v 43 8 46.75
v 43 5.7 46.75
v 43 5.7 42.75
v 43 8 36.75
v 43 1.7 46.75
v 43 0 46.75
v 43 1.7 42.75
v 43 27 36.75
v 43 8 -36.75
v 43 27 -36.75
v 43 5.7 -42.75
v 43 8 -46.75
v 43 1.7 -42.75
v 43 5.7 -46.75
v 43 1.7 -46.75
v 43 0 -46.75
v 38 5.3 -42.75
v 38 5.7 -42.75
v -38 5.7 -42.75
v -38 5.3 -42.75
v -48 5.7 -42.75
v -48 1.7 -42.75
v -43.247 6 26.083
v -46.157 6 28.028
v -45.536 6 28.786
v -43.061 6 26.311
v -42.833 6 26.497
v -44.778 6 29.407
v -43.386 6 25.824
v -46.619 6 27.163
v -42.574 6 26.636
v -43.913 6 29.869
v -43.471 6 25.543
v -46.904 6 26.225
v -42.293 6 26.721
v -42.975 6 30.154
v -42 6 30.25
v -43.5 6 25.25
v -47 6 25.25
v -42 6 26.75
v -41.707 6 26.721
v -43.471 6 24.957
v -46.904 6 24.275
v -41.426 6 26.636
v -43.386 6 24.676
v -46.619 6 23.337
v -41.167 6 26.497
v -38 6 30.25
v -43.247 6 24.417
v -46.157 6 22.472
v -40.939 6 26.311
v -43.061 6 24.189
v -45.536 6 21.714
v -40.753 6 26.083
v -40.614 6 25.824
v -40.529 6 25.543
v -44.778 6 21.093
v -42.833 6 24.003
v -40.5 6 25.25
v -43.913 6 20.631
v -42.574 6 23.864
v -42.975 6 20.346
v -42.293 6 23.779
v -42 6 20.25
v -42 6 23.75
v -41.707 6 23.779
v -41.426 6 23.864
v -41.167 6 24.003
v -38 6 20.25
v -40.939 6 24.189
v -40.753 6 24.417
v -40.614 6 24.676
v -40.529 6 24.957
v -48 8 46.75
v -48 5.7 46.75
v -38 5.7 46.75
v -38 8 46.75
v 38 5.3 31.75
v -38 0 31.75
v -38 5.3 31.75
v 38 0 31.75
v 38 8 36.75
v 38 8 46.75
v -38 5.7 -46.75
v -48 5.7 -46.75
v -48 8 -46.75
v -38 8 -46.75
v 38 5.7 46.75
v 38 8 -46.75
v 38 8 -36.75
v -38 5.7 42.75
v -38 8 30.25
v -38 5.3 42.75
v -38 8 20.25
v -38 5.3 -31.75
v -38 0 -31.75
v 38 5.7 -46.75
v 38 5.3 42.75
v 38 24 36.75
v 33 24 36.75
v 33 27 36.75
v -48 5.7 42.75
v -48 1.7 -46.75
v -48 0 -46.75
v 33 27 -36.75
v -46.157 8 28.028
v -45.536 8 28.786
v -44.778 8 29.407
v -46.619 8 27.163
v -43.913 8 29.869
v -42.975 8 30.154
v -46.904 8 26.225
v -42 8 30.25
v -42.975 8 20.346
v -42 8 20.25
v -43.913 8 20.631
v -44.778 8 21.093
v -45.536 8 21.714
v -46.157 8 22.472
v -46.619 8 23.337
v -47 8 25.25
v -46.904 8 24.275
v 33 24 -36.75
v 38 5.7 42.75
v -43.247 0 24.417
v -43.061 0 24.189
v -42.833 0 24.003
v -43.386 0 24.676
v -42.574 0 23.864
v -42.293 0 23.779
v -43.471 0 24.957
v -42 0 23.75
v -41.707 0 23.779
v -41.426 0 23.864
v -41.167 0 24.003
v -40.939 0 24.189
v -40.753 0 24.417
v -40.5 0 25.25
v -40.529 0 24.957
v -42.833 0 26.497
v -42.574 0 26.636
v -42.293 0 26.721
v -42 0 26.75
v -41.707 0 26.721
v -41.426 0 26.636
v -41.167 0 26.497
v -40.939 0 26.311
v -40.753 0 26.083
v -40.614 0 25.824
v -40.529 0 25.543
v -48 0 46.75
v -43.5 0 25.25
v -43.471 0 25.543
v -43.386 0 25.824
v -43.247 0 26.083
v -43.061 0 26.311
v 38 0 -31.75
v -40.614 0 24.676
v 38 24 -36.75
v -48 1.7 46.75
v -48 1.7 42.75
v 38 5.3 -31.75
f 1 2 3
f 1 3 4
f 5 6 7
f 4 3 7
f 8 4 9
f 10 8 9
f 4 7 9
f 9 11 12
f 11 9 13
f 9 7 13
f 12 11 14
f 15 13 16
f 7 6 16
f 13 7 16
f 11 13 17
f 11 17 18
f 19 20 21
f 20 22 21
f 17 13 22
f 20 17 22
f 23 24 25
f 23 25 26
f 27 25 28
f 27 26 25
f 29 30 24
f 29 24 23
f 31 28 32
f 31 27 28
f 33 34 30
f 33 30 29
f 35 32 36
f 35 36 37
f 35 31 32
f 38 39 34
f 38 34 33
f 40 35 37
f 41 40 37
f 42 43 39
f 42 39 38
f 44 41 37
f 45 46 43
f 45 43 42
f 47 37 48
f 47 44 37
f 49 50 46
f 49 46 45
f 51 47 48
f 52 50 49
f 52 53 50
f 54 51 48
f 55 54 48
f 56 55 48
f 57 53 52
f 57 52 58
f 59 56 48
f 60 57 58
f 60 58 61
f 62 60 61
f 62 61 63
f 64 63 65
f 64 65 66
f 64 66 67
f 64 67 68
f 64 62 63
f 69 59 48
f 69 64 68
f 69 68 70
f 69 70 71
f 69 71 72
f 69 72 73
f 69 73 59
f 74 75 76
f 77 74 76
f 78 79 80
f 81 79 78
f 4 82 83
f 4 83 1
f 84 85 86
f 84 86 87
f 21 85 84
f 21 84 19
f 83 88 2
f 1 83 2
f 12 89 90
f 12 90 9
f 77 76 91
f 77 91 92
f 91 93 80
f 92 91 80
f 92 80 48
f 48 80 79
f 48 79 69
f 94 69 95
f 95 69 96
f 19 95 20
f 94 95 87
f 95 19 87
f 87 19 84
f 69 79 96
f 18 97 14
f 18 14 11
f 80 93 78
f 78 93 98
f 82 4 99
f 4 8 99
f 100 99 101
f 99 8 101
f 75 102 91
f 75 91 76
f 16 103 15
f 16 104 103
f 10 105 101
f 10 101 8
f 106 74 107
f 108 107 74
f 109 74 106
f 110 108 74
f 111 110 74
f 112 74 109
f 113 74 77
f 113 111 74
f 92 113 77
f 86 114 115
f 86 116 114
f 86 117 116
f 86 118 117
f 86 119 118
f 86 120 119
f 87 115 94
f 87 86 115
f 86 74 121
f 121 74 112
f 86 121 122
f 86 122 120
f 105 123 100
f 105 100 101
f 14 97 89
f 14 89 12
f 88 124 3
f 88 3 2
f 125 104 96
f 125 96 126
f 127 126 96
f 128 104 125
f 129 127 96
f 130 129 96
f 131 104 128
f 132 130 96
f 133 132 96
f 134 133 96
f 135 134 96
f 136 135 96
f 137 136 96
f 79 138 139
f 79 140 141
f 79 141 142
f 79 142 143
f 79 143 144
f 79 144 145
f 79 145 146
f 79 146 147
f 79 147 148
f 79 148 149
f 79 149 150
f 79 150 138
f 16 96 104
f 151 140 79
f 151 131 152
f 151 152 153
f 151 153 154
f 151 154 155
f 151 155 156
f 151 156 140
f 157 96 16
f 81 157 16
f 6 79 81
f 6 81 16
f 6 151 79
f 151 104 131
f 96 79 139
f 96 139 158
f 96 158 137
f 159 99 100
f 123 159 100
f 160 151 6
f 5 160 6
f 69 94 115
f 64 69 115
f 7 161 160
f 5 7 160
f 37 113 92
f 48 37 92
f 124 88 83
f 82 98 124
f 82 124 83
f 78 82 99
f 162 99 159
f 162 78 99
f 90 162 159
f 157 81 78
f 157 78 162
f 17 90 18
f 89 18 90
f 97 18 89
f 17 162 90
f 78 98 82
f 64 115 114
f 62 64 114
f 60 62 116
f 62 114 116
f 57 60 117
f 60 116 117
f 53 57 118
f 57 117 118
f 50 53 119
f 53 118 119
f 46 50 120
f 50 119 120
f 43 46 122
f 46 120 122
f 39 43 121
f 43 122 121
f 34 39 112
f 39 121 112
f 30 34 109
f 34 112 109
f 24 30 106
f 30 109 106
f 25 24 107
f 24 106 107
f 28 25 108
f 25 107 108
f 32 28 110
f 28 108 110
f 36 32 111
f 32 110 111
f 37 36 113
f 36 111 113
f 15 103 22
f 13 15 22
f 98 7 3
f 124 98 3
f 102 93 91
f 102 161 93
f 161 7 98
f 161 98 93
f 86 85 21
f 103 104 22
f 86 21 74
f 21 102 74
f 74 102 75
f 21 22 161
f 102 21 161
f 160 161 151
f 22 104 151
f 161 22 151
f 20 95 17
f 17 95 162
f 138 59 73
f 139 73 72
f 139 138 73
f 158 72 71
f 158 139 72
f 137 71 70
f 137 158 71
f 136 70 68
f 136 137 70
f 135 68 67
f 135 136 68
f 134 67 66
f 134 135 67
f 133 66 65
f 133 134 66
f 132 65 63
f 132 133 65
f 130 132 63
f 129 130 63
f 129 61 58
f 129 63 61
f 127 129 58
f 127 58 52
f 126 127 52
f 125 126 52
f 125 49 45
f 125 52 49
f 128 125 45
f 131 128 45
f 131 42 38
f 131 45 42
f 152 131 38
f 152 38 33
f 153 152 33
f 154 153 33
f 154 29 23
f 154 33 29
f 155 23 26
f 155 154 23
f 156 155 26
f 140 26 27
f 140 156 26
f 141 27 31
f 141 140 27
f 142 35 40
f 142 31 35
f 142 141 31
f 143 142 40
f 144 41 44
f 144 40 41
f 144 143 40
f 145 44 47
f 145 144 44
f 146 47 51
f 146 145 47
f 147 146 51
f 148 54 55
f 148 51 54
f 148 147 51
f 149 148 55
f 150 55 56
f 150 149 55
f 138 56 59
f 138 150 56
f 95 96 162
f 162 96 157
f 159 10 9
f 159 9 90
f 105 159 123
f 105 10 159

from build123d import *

# Parameters (mm, degrees)
ESQUISSE1_W             = 91
ESQUISSE1_H             = 73.5
ESQUISSE1_R             = 1.5
ESQUISSE1_W_2           = 76
ESQUISSE1_H_2           = 63.5
BOSS_EXTRU_1_DEPTH      = 8
ENL_V_MAT_EXTRU_1_DEPTH = 2
ESQUISSE3_W             = 76
ESQUISSE3_H             = 5
ENL_V_MAT_EXTRU_2_DEPTH = 2.7
BOSS_EXTRU_2_DEPTH      = 73.5
ESQUISSE5_W             = 91
ESQUISSE5_H             = 10
BOSS_EXTRU_3_DEPTH      = 5.3
ESQUISSE6_W             = 5
ESQUISSE6_H             = 10
ESQUISSE6_W_2           = 10
BOSS_EXTRU_4_DEPTH      = 2.7
ESQUISSE7_W             = 4
ESQUISSE7_H             = 4
ENL_V_MAT_EXTRU_3_DEPTH = 92


with BuildPart() as part:
    # Esquisse1 → Boss.-Extru.1 (new body)
    with BuildSketch(Plane(origin=(0, 0, 0), x_dir=(1, 0, 0), z_dir=(0, 1, 0))):
        with Locations((-2.5, 0)):
            Rectangle(ESQUISSE1_W, ESQUISSE1_H)
        with Locations((-42, -25.25)):
            Circle(ESQUISSE1_R, mode=Mode.SUBTRACT)
        Rectangle(ESQUISSE1_W_2, ESQUISSE1_H_2, mode=Mode.SUBTRACT)
    extrude(amount=BOSS_EXTRU_1_DEPTH)

    # Esquisse2 → Enlèv. mat.-Extru.1 (cut)
    with BuildSketch(Plane(origin=(0, 8, 0), x_dir=(1, 0, 0), z_dir=(0, 1, 0))):
        with BuildLine():
            Line((-42, -30.25), (-38, -30.25))
            Line((-38, -30.25), (-38, -20.25))
            Line((-38, -20.25), (-42, -20.25))
            ThreePointArc((-42, -20.25), (-47, -25.25), (-42, -30.25))
        make_face()
    extrude(amount=-ENL_V_MAT_EXTRU_1_DEPTH, mode=Mode.SUBTRACT)

    # Esquisse3 → Enlèv. mat.-Extru.2 (cut)
    with BuildSketch(Plane(origin=(0, 8, 0), x_dir=(1, 0, 0), z_dir=(0, 1, 0))):
        with Locations((0, -34.25)):
            Rectangle(ESQUISSE3_W, ESQUISSE3_H)
        with Locations((0, 34.25)):
            Rectangle(ESQUISSE3_W, ESQUISSE3_H)
    extrude(amount=-ENL_V_MAT_EXTRU_2_DEPTH, mode=Mode.SUBTRACT)

    # Esquisse4 → Boss.-Extru.2 (add)
    with BuildSketch(Plane(origin=(0, 0, -36.75), x_dir=(-1, 0, 0), z_dir=(0, 0, -1))):
        Polygon((-43, 8), (-38, 8), (-38, 24), (-33, 24), (-33, 27), (-38.815944916, 27), (-43, 27), align=None)
    extrude(amount=-BOSS_EXTRU_2_DEPTH)

    # Esquisse5 → Boss.-Extru.3 (add)
    with BuildSketch(Plane.XZ):
        with Locations((-2.5, -41.75)):
            Rectangle(ESQUISSE5_W, ESQUISSE5_H)
        with Locations((-2.5, 41.75)):
            Rectangle(ESQUISSE5_W, ESQUISSE5_H)
    extrude(amount=-BOSS_EXTRU_3_DEPTH)

    # Esquisse6 → Boss.-Extru.4 (add)
    with BuildSketch(Plane(origin=(0, 5.3, 0), x_dir=(1, 0, 0), z_dir=(0, 1, 0))):
        with Locations((40.5, 41.75)):
            Rectangle(ESQUISSE6_W, ESQUISSE6_H)
        with Locations((40.5, -41.75)):
            Rectangle(ESQUISSE6_W, ESQUISSE6_H)
        with Locations((-43, 41.75)):
            Rectangle(ESQUISSE6_W_2, ESQUISSE6_H)
        with Locations((-43, -41.75)):
            Rectangle(ESQUISSE6_W_2, ESQUISSE6_H)
    extrude(amount=BOSS_EXTRU_4_DEPTH)

    # Esquisse7 → Enlèv. mat.-Extru.3 (cut, through all)
    with BuildSketch(Plane.ZY.offset(48)):
        with Locations((-44.75, 3.7)):
            Rectangle(ESQUISSE7_W, ESQUISSE7_H)
        with Locations((44.75, 3.7)):
            Rectangle(ESQUISSE7_W, ESQUISSE7_H)
    extrude(amount=-ENL_V_MAT_EXTRU_3_DEPTH, mode=Mode.SUBTRACT)


solid = part.part
